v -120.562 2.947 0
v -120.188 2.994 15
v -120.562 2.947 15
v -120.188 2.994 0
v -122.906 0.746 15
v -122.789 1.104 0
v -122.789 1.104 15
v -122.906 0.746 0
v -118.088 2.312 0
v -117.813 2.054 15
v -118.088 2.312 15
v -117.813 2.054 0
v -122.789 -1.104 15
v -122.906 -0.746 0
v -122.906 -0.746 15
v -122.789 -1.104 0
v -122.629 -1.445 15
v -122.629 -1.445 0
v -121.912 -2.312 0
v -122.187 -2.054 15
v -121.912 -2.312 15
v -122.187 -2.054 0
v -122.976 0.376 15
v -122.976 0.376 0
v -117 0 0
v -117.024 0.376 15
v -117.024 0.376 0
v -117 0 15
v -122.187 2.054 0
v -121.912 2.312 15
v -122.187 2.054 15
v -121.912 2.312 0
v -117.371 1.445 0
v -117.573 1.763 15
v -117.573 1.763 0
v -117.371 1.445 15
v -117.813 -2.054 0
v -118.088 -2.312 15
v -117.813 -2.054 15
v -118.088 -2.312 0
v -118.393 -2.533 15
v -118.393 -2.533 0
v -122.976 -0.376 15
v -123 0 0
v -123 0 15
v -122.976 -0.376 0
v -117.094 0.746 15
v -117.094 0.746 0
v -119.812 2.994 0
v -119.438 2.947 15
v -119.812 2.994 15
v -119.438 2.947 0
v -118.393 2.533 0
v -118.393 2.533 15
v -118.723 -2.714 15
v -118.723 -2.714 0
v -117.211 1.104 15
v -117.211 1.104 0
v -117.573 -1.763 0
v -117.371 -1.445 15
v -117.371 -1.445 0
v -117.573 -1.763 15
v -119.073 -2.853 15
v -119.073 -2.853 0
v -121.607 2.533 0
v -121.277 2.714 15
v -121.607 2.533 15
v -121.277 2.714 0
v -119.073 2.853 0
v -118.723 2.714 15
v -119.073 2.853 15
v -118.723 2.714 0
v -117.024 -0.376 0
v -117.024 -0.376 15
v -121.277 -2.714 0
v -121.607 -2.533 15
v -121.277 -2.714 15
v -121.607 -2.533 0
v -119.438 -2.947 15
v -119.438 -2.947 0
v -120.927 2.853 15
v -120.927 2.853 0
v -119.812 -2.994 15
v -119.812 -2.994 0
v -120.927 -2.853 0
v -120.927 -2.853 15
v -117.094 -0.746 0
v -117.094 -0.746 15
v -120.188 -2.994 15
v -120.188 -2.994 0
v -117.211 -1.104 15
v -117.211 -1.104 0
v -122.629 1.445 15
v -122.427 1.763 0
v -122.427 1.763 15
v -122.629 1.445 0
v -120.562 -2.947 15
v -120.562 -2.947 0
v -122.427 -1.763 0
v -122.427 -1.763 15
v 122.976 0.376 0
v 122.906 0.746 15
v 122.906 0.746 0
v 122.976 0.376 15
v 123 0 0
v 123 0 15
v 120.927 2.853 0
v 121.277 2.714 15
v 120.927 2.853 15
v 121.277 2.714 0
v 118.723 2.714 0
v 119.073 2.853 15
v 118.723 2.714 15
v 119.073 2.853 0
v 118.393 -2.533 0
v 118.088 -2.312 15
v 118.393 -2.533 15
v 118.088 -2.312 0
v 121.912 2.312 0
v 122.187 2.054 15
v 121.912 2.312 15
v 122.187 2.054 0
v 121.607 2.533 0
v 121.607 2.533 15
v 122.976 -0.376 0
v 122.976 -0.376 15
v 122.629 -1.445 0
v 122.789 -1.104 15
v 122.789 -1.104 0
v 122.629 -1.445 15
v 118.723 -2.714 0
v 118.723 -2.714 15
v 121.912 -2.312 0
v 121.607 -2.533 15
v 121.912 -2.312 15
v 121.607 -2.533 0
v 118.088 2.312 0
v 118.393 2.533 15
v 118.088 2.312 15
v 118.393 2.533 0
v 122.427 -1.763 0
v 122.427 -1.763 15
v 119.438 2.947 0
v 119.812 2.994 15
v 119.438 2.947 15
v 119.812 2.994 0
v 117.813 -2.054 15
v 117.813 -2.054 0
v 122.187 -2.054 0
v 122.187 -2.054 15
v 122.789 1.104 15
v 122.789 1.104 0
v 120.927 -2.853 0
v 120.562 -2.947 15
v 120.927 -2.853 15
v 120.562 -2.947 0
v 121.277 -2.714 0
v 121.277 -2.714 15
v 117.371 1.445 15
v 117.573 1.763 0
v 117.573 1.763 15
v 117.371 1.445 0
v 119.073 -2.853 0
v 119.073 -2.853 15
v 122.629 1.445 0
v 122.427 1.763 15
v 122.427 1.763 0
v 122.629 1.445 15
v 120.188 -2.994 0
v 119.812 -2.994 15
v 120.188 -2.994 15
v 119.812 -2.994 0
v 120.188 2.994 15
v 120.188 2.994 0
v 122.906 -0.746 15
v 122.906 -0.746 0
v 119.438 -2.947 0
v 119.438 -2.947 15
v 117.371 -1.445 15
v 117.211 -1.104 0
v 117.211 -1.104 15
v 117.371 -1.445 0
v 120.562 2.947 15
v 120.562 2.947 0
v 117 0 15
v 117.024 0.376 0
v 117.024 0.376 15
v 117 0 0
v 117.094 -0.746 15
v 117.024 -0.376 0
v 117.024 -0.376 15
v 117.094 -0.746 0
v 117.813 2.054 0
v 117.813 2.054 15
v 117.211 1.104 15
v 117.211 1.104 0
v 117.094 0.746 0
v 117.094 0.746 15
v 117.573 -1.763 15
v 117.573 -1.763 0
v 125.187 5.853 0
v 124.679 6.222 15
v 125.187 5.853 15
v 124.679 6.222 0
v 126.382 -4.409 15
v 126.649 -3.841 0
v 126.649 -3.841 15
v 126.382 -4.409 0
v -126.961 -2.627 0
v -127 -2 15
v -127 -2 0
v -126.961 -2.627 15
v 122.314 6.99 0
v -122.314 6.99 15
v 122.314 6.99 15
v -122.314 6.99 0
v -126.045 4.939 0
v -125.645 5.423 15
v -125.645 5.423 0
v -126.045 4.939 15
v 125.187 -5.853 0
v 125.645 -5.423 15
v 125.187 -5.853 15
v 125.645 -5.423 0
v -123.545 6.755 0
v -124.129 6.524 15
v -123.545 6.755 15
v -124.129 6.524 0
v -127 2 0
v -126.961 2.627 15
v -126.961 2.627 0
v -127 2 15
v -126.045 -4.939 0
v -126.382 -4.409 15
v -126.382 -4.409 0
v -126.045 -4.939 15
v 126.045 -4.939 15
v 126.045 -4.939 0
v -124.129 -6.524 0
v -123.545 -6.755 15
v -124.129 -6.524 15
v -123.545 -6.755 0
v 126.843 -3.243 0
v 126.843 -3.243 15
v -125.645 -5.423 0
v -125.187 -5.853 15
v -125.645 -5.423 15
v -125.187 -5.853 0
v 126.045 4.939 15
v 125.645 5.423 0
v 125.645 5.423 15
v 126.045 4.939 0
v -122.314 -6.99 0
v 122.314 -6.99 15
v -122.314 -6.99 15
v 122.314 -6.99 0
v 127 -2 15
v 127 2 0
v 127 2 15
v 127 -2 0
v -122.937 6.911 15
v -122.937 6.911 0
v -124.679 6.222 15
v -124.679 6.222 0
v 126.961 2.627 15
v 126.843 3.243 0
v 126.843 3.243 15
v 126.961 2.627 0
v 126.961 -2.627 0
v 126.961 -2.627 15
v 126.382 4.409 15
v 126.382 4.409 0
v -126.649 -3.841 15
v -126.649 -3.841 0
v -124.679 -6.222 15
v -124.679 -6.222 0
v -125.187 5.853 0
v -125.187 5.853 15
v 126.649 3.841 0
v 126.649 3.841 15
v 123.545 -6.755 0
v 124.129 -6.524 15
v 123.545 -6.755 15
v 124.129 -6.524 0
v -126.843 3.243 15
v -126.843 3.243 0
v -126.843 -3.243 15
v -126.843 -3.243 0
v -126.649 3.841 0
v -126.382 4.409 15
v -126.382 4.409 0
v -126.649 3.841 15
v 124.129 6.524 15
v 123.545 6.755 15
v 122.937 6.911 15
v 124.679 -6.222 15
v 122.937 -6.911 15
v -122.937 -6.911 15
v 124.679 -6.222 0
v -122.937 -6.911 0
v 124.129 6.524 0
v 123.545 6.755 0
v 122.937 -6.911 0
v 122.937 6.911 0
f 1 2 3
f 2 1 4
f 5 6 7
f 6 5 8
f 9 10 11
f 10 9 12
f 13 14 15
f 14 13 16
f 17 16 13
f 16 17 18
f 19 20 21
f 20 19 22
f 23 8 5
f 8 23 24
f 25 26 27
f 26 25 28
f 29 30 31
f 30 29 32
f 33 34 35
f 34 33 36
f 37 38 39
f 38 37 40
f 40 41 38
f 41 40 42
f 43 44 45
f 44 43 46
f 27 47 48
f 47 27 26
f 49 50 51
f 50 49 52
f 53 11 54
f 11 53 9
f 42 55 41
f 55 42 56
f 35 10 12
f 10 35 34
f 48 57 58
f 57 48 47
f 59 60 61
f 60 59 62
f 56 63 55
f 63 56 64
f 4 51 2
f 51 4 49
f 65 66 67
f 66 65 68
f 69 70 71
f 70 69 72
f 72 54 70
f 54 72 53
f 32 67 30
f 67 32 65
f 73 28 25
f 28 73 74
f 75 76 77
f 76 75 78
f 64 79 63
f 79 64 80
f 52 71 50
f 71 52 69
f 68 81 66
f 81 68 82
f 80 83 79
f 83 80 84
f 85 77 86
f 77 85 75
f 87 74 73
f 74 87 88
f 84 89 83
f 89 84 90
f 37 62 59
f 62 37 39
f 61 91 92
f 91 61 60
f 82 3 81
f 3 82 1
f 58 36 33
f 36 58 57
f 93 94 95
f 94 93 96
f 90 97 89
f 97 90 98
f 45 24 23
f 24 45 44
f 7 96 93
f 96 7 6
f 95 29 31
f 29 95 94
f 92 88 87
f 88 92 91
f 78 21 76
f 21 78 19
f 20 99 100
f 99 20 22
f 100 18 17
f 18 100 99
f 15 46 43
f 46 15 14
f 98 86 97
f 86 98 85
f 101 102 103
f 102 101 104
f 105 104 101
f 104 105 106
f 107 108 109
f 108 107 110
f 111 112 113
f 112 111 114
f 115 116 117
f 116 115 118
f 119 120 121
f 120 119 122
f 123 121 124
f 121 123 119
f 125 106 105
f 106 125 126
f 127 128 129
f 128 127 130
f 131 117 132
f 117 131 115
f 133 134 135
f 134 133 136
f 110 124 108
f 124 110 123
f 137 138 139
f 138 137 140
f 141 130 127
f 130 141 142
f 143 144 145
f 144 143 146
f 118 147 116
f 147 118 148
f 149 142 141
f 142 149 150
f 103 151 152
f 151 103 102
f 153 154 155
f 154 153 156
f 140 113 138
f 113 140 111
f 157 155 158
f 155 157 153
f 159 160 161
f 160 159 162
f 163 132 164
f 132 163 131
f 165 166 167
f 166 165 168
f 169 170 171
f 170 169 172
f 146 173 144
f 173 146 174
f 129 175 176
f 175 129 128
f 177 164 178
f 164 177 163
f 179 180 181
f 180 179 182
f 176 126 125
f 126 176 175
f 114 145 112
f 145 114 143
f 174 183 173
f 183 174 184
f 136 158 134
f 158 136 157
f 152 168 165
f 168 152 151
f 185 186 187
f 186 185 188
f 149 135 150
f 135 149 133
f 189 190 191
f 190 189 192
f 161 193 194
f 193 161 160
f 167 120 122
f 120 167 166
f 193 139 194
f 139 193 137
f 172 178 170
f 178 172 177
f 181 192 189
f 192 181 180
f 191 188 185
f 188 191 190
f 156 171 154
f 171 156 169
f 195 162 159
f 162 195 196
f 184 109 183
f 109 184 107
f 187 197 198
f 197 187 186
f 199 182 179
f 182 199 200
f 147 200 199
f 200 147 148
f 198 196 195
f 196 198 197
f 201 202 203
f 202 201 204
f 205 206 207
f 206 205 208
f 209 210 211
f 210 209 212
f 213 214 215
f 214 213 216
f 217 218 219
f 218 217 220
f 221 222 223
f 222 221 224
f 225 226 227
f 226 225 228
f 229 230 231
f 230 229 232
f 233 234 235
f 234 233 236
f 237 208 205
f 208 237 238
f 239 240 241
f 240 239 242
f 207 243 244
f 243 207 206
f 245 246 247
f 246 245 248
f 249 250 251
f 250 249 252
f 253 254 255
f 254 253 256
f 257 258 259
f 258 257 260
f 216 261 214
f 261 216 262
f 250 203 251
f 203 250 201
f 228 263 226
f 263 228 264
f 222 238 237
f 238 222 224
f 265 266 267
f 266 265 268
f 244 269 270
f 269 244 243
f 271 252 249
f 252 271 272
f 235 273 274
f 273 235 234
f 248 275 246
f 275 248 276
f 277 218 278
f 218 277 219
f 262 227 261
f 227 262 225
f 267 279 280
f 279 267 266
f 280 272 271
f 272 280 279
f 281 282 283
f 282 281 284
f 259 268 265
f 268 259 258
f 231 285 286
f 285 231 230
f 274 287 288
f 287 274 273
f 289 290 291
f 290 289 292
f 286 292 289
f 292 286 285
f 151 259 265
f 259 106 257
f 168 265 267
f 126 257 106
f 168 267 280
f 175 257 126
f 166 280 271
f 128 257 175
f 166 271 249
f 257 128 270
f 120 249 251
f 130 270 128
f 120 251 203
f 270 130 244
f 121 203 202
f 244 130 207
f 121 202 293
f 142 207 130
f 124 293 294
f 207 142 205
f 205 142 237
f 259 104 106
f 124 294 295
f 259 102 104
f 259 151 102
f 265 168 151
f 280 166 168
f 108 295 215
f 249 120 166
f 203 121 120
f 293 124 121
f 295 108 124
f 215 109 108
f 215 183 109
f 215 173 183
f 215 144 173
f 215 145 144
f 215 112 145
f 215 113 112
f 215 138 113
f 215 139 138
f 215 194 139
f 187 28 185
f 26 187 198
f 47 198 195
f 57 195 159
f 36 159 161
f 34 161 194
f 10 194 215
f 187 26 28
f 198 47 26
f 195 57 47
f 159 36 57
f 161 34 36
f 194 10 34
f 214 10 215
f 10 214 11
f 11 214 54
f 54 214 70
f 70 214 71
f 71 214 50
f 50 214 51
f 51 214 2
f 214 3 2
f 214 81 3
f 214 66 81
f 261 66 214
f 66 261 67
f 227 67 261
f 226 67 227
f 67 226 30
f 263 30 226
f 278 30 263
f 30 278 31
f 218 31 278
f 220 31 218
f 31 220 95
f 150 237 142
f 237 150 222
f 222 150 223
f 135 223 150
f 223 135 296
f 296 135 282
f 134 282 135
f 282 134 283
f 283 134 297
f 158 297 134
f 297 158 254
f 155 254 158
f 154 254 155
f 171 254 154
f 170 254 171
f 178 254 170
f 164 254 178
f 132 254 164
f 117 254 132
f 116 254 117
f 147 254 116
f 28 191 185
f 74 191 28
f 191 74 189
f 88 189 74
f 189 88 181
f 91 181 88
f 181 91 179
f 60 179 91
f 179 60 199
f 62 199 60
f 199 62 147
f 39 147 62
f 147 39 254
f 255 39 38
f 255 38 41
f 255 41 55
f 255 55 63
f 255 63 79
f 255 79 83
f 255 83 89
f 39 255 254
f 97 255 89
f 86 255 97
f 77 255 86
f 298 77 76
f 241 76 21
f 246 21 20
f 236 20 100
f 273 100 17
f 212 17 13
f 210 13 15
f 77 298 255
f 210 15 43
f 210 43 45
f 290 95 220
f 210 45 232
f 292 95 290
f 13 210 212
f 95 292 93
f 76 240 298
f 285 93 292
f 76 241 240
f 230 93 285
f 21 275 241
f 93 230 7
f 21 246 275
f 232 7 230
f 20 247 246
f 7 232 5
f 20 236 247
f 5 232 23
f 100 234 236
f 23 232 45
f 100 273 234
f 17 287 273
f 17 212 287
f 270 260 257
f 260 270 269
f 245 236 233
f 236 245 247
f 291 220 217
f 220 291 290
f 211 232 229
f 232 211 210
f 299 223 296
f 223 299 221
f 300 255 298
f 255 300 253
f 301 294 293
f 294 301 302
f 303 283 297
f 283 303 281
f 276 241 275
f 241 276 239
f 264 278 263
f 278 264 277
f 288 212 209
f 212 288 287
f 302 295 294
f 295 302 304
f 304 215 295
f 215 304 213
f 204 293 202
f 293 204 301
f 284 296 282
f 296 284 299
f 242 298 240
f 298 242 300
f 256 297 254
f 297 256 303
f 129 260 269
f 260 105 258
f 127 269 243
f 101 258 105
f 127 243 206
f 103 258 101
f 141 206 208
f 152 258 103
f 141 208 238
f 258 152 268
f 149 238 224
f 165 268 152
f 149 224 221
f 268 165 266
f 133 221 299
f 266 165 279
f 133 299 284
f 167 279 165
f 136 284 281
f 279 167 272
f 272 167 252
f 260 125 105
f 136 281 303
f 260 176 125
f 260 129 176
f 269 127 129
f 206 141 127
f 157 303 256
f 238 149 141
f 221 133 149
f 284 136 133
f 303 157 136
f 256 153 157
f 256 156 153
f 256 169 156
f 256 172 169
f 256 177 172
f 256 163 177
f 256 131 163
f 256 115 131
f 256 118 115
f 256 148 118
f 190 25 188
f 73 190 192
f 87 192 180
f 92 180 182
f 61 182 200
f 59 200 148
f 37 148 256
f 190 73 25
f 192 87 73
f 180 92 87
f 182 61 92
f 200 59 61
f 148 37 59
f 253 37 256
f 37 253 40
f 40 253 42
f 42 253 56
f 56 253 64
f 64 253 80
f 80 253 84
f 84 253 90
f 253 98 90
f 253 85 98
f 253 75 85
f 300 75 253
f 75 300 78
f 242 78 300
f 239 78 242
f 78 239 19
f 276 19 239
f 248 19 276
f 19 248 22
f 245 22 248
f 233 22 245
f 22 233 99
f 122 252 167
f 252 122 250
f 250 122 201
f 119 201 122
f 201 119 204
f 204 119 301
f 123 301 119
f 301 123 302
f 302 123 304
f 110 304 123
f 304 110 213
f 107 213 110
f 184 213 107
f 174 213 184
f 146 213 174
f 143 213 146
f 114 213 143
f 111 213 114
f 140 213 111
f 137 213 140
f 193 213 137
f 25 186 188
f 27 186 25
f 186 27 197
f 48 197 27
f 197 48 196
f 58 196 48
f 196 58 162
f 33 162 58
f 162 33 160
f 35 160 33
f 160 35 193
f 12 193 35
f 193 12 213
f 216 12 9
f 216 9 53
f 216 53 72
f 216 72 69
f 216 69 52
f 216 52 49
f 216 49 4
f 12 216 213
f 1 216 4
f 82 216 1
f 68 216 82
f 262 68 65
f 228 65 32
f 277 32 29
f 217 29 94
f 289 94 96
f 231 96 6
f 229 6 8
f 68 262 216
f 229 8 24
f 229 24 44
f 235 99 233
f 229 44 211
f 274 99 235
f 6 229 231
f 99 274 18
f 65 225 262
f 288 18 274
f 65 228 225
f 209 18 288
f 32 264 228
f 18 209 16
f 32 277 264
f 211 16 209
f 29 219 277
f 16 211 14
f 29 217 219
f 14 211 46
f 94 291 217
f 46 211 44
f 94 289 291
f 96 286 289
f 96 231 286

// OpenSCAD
$fn = 50;


difference() {
	union() {
		hull() {
			translate(v = [-122.0000000000, 2.0000000000, 0]) {
				cylinder(h = 15, r = 5);
			}
			translate(v = [122.0000000000, 2.0000000000, 0]) {
				cylinder(h = 15, r = 5);
			}
			translate(v = [-122.0000000000, -2.0000000000, 0]) {
				cylinder(h = 15, r = 5);
			}
			translate(v = [122.0000000000, -2.0000000000, 0]) {
				cylinder(h = 15, r = 5);
			}
		}
	}
	union() {
		translate(v = [-120.0000000000, 0.0000000000, -100.0000000000]) {
			cylinder(h = 200, r = 3.0000000000);
		}
		translate(v = [-120.0000000000, 0.0000000000, -100.0000000000]) {
			cylinder(h = 200, r = 3.0000000000);
		}
		translate(v = [120.0000000000, 0.0000000000, -100.0000000000]) {
			cylinder(h = 200, r = 3.0000000000);
		}
		translate(v = [120.0000000000, 0.0000000000, -100.0000000000]) {
			cylinder(h = 200, r = 3.0000000000);
		}
	}
}
